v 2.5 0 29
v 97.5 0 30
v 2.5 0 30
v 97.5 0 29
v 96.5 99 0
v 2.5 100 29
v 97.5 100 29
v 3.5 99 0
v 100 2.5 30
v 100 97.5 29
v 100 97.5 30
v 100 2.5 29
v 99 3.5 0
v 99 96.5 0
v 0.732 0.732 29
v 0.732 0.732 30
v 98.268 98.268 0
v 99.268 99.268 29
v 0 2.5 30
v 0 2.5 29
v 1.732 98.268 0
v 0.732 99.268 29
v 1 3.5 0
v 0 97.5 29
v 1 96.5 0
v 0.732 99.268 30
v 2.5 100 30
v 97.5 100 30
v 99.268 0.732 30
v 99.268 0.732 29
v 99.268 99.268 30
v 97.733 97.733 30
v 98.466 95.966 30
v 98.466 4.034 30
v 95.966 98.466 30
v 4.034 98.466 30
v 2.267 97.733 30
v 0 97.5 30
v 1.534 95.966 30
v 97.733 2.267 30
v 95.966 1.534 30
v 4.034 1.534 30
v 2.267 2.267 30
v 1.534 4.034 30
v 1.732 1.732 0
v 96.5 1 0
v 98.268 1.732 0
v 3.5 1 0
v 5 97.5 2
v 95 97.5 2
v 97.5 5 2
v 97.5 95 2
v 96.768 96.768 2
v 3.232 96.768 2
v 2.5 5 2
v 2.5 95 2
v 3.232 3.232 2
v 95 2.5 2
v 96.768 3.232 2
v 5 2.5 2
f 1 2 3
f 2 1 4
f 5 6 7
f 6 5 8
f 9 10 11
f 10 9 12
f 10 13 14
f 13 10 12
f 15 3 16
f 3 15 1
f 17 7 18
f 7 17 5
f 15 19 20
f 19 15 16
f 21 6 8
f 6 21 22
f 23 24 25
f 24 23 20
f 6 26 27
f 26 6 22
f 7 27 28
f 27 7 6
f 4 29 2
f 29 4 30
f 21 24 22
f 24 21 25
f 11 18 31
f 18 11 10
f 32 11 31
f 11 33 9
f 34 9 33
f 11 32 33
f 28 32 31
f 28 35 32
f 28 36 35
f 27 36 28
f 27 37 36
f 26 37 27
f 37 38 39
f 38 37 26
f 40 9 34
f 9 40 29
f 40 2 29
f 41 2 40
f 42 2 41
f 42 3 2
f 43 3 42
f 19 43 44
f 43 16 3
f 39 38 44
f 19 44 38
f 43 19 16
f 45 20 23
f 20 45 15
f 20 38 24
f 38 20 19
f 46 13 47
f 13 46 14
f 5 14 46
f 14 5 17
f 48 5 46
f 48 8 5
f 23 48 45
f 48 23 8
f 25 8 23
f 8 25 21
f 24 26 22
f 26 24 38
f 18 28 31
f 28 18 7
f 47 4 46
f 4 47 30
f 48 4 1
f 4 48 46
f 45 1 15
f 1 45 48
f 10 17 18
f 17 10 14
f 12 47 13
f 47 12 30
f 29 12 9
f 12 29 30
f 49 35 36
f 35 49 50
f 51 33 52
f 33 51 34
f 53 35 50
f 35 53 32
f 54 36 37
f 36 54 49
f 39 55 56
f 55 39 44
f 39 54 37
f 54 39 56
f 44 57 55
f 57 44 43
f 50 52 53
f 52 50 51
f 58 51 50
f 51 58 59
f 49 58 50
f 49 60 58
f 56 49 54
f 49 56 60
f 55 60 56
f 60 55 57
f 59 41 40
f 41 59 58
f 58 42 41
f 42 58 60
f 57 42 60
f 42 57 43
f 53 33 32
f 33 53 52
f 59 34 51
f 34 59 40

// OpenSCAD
x=100;
y=100;
z=30;
wall=1.5;
bottom=2;
cornerdia=5;
gradient=1;
difference()
{    hull(){
        translate([(cornerdia/2)+gradient,(cornerdia/2)+gradient,0]) cylinder(d=cornerdia, h=1);
        translate([(cornerdia/2)+gradient,y-(cornerdia/2)-gradient,0]) cylinder(d=cornerdia, h=1);
        translate([x-(cornerdia/2)-gradient,(cornerdia/2)+gradient,0]) cylinder(d=cornerdia, h=1);
        translate([x-(cornerdia/2)-gradient,y-(cornerdia/2)-gradient,0]) cylinder(d=cornerdia, h=1);

        translate([(cornerdia/2),(cornerdia/2),z-1]) cylinder(d=cornerdia, h=1);
        translate([(cornerdia/2),y-(cornerdia/2),z-1]) cylinder(d=cornerdia, h=1);
        translate([x-(cornerdia/2),(cornerdia/2),z-1]) cylinder(d=cornerdia, h=1);
        translate([x-(cornerdia/2),y-(cornerdia/2),z-1]) cylinder(d=cornerdia, h=1);
    }
    hull(){
        translate([(cornerdia/2)+gradient+wall,(cornerdia/2)+gradient+wall,bottom]) cylinder(d=cornerdia, h=1);
        translate([(cornerdia/2)+gradient+wall,y-(cornerdia/2)-gradient-wall,bottom]) cylinder(d=cornerdia, h=1);
        translate([x-(cornerdia/2)-gradient-wall,(cornerdia/2)+gradient+wall,bottom]) cylinder(d=cornerdia, h=1);
        translate([x-(cornerdia/2)-gradient-wall,y-(cornerdia/2)-gradient-wall,bottom]) cylinder(d=cornerdia, h=1);

        translate([(cornerdia/2)+wall,(cornerdia/2)+wall,z-1+bottom]) cylinder(d=cornerdia, h=1);
        translate([(cornerdia/2)+wall,y-(cornerdia/2)-wall,z-1+bottom]) cylinder(d=cornerdia, h=1);
        translate([x-(cornerdia/2)-wall,(cornerdia/2)+wall,z-1+bottom]) cylinder(d=cornerdia, h=1);
        translate([x-(cornerdia/2)-wall,y-(cornerdia/2)-wall,z-1+bottom]) cylinder(d=cornerdia, h=1);
     }
 }
